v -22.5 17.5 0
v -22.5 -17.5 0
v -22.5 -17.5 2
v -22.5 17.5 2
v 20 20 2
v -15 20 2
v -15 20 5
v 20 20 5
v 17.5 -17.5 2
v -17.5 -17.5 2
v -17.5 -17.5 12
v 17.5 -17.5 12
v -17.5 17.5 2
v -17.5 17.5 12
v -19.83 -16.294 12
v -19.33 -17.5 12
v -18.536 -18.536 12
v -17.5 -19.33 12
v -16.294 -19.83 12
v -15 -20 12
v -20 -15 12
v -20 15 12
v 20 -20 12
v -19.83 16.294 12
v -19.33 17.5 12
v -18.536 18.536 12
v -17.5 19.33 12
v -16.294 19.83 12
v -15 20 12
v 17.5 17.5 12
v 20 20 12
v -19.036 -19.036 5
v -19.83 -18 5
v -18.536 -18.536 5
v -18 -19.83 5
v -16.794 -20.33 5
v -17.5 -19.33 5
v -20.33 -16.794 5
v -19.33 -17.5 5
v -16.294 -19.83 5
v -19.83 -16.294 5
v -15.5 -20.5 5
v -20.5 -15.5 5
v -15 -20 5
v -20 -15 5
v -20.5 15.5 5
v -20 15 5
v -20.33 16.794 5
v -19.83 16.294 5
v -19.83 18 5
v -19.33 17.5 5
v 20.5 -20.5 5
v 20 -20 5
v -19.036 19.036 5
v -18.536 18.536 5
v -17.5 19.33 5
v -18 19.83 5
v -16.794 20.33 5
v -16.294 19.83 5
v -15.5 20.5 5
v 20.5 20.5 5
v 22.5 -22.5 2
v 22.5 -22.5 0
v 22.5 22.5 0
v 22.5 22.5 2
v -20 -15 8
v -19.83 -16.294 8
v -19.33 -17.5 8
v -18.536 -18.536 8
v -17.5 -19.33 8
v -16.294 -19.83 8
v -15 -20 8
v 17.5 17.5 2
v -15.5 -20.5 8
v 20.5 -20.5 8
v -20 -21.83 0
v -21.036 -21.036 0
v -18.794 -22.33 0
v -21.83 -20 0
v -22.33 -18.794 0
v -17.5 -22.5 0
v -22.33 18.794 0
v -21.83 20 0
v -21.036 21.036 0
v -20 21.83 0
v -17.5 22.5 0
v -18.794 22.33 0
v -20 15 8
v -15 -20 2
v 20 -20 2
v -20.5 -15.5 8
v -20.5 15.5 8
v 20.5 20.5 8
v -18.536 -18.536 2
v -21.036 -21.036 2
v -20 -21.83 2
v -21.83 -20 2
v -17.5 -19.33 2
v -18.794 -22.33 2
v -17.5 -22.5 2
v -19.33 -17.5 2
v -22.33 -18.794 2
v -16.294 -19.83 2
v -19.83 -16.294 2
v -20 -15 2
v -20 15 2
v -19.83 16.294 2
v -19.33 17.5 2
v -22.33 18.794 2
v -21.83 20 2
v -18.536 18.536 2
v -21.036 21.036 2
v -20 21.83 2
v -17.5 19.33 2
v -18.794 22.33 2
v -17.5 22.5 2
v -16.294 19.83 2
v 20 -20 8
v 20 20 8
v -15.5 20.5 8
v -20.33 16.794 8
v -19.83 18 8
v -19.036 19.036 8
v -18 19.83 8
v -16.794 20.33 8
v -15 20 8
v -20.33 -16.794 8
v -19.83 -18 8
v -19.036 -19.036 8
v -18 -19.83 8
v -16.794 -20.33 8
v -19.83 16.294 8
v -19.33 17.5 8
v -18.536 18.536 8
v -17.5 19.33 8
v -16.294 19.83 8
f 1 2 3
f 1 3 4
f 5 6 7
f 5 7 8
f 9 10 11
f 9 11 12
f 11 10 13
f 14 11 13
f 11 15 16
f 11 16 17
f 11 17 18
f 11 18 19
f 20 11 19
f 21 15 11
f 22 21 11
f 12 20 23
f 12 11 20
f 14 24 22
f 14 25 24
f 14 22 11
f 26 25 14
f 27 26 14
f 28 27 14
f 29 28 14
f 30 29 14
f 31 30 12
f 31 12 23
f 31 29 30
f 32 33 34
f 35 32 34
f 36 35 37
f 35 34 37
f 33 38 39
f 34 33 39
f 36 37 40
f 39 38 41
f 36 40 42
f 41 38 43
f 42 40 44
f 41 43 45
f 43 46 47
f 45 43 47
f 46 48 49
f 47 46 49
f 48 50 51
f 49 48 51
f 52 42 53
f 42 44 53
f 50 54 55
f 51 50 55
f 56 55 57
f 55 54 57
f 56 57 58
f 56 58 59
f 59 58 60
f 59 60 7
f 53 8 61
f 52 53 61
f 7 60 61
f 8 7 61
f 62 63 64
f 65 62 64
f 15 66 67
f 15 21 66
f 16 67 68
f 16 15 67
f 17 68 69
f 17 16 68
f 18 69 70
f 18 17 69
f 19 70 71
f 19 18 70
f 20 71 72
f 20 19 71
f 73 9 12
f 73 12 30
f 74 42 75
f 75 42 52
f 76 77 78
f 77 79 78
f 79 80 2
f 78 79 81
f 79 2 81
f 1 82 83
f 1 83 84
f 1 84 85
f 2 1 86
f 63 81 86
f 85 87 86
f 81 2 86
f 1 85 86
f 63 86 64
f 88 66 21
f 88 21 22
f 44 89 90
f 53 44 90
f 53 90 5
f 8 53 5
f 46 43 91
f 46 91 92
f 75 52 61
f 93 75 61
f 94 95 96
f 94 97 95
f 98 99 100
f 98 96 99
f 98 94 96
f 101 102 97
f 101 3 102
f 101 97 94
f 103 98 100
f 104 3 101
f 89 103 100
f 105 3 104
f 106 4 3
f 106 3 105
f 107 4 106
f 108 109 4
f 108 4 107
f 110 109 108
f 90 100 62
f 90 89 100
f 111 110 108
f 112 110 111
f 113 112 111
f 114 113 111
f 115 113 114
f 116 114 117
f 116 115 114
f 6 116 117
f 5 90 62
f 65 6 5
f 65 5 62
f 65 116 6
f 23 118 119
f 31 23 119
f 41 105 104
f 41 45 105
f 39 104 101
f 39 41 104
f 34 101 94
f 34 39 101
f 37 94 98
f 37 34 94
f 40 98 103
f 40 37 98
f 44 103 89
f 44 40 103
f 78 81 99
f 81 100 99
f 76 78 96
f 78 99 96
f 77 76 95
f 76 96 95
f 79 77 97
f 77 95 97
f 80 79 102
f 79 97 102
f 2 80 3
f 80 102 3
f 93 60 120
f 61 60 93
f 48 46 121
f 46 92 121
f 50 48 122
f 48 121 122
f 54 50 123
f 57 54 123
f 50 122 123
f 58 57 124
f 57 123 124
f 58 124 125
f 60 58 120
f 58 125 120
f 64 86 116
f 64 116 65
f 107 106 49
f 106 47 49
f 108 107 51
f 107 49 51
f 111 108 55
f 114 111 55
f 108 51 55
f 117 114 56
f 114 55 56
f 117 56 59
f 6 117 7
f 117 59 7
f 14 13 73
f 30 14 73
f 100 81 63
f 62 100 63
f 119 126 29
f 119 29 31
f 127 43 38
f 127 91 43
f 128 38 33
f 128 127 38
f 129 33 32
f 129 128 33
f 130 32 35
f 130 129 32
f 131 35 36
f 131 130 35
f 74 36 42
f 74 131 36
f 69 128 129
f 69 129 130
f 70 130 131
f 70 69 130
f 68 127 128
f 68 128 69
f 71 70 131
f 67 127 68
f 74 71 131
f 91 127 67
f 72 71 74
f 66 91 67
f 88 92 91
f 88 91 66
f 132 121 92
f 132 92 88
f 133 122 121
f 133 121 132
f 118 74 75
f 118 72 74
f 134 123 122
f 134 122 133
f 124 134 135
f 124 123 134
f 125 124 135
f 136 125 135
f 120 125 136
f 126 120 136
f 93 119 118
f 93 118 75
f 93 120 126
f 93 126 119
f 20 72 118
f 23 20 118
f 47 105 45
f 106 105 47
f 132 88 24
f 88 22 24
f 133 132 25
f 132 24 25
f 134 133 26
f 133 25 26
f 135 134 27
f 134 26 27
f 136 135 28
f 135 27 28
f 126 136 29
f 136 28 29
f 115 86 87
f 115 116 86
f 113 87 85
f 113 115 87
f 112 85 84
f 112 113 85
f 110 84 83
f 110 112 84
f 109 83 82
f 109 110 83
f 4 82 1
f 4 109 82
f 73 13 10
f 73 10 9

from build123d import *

# Parameters (mm, degrees)
F0_W     = 45
F0_H     = 45
F1_DEPTH = 2
F2_W     = 40
F2_H     = 40
F2_W_2   = 35
F2_H_2   = 35
F3_DEPTH = 10
F5_START = 3
F4_W     = 41
F4_H     = 41
F4_W_2   = 35
F4_H_2   = 35
F5_DEPTH = 3
F6_R     = 5


with BuildPart() as f1:
    # F0 (on Top) → F1 (new body)
    with BuildSketch(Plane.XY):
        Rectangle(F0_W, F0_H)
    extrude(amount=F1_DEPTH)

    # F2 (on face) → F3 (join)
    with BuildSketch(Plane.XY.offset(2)):
        Rectangle(F2_W, F2_H)
        Rectangle(F2_W_2, F2_H_2, mode=Mode.SUBTRACT)
    extrude(amount=F3_DEPTH)

    # F4 (on face) → F5 (join)
    with BuildSketch(Plane.XY.offset(2).offset(F5_START)):
        Rectangle(F4_W, F4_H)
        Rectangle(F4_W_2, F4_H_2, mode=Mode.SUBTRACT)
    extrude(amount=F5_DEPTH)

    # F6
    f6_edges = [f1.edges().sort_by_distance(p)[0] for p in [
        (-22.5, 22.5, 1),
        (-20, 20, 3.5),
        (-20.5, 20.5, 6.5),
        (-20, 20, 10),
        (-22.5, -22.5, 1),
        (-20, -20, 3.5),
        (-20.5, -20.5, 6.5),
        (-20, -20, 10),
    ]]
    fillet(f6_edges, radius=F6_R)


solid = f1.part
